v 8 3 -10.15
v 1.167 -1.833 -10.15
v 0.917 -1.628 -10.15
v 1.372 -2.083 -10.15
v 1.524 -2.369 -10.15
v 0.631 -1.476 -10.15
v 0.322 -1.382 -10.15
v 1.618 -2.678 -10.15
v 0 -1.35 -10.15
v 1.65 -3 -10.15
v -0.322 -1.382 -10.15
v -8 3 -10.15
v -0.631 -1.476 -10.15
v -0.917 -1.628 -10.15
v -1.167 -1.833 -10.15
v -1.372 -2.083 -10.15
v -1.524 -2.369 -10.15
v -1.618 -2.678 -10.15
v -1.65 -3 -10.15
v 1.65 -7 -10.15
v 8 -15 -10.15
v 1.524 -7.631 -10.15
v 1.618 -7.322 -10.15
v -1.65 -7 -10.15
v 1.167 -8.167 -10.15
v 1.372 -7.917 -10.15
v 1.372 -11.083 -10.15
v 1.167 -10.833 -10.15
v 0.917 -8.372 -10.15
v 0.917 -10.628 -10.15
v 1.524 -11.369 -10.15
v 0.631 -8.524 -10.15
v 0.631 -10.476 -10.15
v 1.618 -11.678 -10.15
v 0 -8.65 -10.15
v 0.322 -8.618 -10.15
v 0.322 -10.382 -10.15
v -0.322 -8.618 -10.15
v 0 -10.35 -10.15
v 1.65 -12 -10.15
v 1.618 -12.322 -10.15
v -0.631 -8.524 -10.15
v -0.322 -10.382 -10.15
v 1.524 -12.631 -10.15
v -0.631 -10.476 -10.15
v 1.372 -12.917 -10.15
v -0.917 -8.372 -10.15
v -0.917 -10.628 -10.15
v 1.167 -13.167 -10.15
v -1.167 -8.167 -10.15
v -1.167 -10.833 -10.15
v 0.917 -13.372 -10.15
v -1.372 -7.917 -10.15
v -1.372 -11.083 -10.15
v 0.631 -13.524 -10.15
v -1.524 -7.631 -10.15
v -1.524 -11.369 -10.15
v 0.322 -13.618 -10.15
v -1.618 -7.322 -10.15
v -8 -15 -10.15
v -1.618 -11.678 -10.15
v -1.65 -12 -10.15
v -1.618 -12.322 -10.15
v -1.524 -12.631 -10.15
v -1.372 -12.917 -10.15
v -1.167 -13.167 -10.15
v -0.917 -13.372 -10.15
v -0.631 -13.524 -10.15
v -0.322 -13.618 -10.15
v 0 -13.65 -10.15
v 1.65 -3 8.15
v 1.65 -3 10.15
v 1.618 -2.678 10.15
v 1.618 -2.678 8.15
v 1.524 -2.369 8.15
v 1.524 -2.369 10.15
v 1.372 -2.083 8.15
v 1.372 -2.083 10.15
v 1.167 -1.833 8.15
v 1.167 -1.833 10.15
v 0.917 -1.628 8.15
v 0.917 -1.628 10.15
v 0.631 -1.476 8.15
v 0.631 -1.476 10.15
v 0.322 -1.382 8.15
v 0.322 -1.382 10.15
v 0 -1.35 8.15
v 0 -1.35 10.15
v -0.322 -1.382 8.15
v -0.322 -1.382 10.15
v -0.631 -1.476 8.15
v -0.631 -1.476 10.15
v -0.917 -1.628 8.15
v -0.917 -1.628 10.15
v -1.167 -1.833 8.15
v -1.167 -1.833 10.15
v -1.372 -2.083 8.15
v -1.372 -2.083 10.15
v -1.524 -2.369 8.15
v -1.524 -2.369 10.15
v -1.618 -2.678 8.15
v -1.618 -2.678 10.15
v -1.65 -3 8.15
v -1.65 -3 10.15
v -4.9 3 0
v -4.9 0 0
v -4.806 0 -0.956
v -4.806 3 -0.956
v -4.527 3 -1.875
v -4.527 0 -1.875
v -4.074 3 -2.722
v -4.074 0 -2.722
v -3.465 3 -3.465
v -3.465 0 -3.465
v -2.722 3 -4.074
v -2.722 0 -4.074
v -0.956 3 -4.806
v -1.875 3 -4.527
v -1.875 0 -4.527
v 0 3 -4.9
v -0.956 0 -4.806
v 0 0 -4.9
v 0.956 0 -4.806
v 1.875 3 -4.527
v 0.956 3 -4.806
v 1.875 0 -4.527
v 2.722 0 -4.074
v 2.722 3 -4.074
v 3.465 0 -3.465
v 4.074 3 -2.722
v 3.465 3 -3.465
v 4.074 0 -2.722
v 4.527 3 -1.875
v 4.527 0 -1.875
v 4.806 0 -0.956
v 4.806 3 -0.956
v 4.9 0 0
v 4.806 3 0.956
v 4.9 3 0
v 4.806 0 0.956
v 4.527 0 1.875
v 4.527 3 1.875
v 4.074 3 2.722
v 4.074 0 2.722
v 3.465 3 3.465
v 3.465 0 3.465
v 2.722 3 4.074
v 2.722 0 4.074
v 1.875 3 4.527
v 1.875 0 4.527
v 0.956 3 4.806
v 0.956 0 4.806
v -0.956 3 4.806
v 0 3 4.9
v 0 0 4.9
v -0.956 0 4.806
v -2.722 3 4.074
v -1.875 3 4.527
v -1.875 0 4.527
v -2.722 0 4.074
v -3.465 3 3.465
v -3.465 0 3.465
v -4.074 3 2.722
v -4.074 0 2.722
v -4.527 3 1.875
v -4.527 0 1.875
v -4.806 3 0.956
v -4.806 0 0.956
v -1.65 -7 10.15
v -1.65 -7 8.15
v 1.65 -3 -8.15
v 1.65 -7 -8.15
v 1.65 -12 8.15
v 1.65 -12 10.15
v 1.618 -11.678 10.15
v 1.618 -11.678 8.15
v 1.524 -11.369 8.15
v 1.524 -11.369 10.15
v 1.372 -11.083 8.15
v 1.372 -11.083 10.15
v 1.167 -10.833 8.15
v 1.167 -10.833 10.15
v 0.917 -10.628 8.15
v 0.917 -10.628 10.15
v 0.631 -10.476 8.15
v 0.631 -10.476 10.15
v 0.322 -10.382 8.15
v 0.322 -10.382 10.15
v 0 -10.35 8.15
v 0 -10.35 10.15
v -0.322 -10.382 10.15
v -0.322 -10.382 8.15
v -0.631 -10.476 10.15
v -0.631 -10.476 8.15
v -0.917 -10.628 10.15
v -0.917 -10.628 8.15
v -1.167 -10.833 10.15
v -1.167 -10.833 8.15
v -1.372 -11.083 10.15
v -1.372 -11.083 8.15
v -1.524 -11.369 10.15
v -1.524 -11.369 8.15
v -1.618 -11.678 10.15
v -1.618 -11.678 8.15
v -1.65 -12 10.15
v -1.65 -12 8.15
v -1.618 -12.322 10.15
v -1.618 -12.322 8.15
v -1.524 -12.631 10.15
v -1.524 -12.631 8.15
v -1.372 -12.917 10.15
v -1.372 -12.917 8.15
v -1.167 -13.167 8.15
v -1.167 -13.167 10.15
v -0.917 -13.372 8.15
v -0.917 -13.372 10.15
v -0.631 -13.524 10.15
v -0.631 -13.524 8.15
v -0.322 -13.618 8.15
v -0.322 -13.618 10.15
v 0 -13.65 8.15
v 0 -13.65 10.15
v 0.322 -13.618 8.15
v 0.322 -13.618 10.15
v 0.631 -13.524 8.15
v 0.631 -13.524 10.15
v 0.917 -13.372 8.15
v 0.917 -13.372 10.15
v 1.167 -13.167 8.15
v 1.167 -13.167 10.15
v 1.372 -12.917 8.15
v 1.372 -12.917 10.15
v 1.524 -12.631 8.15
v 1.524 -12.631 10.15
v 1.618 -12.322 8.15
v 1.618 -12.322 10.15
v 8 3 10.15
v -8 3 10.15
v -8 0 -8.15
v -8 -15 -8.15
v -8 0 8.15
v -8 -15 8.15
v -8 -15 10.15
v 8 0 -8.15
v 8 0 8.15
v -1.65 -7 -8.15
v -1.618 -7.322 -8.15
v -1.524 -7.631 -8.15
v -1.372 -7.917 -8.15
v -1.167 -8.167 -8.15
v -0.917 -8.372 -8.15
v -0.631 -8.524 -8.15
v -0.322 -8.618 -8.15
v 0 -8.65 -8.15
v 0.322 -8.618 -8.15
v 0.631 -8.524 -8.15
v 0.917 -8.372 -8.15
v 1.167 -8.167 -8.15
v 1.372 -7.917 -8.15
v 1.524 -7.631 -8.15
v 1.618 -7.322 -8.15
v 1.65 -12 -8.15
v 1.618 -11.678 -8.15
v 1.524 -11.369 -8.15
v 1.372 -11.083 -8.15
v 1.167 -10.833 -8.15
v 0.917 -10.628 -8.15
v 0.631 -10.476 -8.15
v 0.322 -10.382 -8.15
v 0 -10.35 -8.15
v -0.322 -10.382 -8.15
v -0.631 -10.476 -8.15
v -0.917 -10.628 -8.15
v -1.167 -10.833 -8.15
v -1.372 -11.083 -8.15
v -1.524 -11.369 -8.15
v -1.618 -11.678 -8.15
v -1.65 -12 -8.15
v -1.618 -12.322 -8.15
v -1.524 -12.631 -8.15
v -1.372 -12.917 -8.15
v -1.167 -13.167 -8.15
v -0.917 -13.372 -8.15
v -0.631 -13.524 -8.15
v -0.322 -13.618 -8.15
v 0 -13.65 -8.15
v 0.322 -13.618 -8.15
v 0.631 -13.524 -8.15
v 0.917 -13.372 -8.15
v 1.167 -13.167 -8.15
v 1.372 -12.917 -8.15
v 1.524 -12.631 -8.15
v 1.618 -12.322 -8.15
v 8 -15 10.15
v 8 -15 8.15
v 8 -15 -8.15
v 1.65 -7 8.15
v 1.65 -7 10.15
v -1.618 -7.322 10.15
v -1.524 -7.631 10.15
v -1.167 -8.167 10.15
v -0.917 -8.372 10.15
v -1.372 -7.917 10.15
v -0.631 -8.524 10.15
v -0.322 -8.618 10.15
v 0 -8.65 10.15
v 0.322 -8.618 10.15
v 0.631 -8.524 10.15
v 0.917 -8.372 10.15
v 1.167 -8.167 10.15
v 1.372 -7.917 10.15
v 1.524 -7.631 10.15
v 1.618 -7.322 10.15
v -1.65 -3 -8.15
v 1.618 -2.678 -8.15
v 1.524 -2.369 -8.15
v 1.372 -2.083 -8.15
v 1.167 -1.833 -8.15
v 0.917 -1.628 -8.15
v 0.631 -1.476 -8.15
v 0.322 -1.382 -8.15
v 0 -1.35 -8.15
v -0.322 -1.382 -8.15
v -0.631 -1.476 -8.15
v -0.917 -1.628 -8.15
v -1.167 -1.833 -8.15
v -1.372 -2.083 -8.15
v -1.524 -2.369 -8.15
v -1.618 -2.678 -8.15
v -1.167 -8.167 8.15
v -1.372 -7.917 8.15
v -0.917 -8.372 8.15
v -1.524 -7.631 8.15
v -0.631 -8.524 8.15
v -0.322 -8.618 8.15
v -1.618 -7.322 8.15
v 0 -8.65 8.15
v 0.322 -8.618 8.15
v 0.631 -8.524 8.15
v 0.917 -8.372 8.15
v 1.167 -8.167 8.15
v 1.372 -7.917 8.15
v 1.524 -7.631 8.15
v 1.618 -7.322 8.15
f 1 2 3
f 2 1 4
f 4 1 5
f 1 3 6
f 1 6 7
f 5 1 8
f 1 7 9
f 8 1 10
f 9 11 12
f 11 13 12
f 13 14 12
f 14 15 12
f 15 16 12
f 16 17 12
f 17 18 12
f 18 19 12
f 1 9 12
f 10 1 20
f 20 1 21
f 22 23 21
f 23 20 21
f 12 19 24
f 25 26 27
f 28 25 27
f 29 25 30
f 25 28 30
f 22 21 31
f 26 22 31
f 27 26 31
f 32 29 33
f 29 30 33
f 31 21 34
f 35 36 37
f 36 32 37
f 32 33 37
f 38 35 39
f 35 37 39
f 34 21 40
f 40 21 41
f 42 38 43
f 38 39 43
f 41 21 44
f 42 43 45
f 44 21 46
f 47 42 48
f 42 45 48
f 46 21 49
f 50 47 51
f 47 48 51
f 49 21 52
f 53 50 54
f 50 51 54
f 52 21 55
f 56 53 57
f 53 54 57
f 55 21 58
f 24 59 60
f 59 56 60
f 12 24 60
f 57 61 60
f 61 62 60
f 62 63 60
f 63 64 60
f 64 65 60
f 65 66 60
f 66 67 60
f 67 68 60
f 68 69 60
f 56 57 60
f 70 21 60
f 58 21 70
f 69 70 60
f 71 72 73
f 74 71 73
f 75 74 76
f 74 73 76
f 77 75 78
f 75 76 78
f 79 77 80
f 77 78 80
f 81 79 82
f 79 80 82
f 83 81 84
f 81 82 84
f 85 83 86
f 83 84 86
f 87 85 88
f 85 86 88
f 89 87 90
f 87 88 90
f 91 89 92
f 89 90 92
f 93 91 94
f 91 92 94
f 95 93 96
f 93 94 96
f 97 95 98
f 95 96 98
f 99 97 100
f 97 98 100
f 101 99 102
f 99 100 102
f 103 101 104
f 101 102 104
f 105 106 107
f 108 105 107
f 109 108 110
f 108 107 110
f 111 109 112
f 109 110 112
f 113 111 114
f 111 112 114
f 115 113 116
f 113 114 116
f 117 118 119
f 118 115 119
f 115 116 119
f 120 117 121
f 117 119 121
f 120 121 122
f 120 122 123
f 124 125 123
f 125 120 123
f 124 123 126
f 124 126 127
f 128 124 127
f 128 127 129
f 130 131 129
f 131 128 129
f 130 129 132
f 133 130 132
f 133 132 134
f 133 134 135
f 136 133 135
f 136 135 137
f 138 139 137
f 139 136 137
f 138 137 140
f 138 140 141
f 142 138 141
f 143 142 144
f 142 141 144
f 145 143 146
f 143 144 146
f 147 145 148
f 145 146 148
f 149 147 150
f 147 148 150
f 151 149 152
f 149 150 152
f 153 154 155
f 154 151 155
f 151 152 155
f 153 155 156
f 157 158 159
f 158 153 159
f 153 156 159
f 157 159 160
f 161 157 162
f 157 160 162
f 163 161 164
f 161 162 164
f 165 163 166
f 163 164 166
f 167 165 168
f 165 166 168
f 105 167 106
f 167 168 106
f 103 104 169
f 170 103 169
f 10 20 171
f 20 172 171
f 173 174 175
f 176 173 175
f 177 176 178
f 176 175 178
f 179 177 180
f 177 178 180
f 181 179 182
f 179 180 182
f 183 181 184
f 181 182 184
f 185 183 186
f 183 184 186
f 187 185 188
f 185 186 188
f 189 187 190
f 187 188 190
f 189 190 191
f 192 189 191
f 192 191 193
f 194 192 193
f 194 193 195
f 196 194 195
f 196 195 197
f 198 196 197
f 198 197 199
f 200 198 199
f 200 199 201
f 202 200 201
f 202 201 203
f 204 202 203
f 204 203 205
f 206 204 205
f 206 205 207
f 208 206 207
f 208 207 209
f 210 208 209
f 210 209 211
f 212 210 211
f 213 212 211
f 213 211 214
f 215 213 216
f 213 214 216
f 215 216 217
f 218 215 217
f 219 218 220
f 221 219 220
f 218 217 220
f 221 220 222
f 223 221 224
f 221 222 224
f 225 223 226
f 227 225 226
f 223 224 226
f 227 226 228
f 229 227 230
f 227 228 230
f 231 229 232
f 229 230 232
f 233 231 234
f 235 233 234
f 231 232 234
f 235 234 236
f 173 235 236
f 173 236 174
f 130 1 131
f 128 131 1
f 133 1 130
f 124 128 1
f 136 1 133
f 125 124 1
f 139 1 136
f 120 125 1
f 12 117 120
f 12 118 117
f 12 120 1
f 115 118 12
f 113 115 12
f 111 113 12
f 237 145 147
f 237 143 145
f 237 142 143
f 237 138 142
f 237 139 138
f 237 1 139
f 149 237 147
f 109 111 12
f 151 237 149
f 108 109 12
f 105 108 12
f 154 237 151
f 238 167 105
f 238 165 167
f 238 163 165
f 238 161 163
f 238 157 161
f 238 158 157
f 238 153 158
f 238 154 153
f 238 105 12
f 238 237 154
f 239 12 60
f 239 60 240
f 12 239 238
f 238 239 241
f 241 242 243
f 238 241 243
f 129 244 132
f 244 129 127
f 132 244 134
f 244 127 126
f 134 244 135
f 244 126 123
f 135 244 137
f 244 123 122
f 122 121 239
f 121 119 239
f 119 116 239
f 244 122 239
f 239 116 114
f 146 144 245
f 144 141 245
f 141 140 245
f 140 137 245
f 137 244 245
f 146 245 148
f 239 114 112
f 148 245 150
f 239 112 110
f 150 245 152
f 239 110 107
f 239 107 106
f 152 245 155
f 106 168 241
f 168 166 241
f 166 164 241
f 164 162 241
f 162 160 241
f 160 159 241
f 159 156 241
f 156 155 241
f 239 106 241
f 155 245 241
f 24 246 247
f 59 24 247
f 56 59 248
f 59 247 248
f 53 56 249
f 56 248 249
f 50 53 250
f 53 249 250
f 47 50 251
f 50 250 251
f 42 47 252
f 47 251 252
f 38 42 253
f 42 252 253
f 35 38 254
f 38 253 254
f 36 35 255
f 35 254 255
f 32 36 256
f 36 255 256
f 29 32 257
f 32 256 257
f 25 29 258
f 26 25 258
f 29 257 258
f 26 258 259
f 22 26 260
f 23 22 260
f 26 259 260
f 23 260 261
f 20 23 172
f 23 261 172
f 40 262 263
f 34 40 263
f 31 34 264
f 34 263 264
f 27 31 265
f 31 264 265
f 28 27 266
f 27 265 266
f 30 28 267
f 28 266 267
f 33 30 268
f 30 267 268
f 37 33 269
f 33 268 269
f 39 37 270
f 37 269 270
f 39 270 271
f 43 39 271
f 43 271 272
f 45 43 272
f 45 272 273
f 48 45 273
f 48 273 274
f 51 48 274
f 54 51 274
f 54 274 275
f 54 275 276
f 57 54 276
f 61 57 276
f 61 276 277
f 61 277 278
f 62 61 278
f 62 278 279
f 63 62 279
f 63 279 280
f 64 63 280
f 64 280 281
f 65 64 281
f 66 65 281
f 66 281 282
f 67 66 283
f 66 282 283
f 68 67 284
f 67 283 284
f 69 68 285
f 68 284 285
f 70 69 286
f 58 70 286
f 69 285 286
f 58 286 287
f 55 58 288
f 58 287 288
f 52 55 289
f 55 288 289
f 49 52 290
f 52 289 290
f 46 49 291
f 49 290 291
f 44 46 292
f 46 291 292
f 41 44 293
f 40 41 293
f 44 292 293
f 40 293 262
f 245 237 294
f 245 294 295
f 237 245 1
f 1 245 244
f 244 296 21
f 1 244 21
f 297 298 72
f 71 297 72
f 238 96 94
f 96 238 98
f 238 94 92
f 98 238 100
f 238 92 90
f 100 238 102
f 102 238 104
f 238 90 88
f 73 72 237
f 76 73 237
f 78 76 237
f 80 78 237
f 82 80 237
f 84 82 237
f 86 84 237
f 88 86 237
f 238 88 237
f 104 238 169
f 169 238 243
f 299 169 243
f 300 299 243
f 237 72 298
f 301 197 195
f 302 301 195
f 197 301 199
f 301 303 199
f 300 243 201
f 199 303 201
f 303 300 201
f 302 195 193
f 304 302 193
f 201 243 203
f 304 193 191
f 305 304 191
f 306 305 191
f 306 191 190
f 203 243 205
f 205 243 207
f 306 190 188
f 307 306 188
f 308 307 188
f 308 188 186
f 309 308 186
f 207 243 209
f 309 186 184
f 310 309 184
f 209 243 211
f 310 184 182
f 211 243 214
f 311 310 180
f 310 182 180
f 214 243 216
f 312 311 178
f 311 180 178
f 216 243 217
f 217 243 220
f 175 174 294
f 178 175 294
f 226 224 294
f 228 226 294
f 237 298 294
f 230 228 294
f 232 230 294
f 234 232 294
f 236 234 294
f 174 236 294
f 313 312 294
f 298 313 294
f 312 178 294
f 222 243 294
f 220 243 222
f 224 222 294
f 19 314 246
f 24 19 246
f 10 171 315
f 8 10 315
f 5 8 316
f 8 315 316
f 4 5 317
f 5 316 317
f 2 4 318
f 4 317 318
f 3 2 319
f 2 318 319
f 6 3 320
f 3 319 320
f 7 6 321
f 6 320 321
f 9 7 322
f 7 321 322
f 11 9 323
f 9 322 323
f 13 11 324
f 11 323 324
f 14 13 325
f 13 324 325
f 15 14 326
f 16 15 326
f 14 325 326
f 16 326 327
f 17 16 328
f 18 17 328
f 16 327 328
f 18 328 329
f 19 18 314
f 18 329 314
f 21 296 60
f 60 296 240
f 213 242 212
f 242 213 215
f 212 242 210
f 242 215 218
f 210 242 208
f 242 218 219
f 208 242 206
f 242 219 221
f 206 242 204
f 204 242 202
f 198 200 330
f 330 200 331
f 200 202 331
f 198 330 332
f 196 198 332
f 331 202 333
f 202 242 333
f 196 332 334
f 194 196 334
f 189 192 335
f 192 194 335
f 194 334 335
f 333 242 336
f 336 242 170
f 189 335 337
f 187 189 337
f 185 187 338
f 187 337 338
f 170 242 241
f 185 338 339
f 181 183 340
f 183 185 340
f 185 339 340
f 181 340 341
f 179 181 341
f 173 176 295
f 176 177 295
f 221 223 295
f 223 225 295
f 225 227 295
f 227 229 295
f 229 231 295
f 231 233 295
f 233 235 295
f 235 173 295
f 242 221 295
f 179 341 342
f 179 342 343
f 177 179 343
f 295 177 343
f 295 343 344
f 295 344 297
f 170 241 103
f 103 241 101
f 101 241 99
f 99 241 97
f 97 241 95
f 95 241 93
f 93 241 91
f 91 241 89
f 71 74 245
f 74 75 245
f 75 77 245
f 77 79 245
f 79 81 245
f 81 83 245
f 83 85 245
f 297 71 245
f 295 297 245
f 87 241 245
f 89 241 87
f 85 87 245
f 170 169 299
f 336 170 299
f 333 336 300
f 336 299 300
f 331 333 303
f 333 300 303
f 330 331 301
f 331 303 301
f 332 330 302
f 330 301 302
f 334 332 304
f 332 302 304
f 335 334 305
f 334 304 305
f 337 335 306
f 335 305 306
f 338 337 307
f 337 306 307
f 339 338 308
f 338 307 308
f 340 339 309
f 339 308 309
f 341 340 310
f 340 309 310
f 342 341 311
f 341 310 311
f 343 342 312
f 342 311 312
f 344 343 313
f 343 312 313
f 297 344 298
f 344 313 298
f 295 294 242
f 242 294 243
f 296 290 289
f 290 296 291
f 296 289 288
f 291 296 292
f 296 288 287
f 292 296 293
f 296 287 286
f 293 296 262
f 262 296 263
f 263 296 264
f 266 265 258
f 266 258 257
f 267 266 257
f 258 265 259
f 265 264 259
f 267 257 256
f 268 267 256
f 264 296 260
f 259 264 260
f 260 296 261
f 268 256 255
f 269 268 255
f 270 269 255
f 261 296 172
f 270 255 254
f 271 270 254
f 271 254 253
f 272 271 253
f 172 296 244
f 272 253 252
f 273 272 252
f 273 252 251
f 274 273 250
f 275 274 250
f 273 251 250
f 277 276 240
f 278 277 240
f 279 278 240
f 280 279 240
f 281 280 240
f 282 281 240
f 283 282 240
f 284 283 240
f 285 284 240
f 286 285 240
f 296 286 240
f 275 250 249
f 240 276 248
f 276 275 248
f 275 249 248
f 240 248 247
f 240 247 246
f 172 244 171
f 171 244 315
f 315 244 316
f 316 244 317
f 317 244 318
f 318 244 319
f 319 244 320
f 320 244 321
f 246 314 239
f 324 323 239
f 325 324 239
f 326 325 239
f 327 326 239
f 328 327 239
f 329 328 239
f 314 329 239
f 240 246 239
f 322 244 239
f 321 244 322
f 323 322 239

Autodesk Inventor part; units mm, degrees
ref_plane "YZ Plane" through (0, 0, 0) normal (1, 0, 0) x (0, 1, 0)
ref_plane "XZ Plane" through (0, 0, 0) normal (0, 1, 0) x (-1, 0, 0)
ref_plane "XY Plane" through (0, 0, 0) normal (0, 0, 1) x (1, 0, 0)
sketch "Sketch1" plane through (0, 0, 0) normal (0, 1, 0) x (-1, 0, 0)
  circle A0 centre (0, 0) radius 4.9
  circle A1 centre (0, 0) radius 6.9
  line L0 (6.9, 8) -> (-5.9499, 8) construction
  line L1 (6.9, -8) -> (-5.9499, -8) construction
  line L2 (8, 8.15) -> (-8, 8.15)
  line L3 (-8, 8.15) -> (-8, -8.15)
  line L4 (-8, -8.15) -> (8, -8.15)
  line L5 (8, -8.15) -> (8, 8.15)
  line L6 (8, 8.15) -> (8, 10.15)
  line L7 (8, 10.15) -> (-8, 10.15)
  line L8 (-8, 10.15) -> (-8, 8.15)
  line L9 (-8, -8.15) -> (-8, -10.15)
  line L10 (-8, -10.15) -> (8, -10.15)
  line L11 (8, -10.15) -> (8, -8.15)
  point P0 (0, -8.15)
  dimension "d0" = 9.8
  dimension "d1" = 2
  dimension "d2" = 16
  dimension "d3" = 8
  dimension "d4" = 0.15
  dimension "d5" = 0.15
  dimension "d6" = 16
  dimension "d7" = 2
  dimension "d8" = 2
extrude "Extrusion1" add sketch "Sketch1" along normal blind 3 contours A1 | L5 L4 L3 L2 | L2 L8 L7 L6 | L11 L10 L9 L4
extrude "Extrusion2" add sketch "Sketch1" against normal blind 15 contours L2 L8 L7 L6 | L11 L10 L9 L4
sketch "Sketch2" plane through (-8, 3, 10.15) normal (0, 0, 1) x (1, 0, 0)
  circle A0 centre (8, -15) radius 1.65
  line L0 (16, -18) -> (0, -18) projected
  point P0 (8, -3)
  point P1 (8, -18)
  dimension "d13" = 3.3
  dimension "d14" = 3
extrude "Extrusion3" cut sketch "Sketch2" against normal through all
sketch "Sketch3" plane through (-8, 3, 10.15) normal (0, 0, 1) x (1, 0, 0)
  line L0 (8, -10) -> (8, -6) construction
  line L1 (9.65, -10) -> (9.65, -6)
  line L2 (6.35, -6) -> (6.35, -10)
  arc A0 (6.35, -10) -> (9.65, -10) centre (8, -10) ccw
  arc A1 (9.65, -6) -> (6.35, -6) centre (8, -6) ccw
  circle A2 centre (8, -15) radius 1.65 projected
  point P0 (8, -3)
  point P1 (8, -8)
  dimension "d17" = 3.3
  dimension "d18" = 4
  dimension "d19" = 5
extrude "Extrusion4" cut sketch "Sketch3" against normal through all contours A0 L2 A1 L1
properties part number "ShaftSyncAdapter" material "ABS Plastic"
